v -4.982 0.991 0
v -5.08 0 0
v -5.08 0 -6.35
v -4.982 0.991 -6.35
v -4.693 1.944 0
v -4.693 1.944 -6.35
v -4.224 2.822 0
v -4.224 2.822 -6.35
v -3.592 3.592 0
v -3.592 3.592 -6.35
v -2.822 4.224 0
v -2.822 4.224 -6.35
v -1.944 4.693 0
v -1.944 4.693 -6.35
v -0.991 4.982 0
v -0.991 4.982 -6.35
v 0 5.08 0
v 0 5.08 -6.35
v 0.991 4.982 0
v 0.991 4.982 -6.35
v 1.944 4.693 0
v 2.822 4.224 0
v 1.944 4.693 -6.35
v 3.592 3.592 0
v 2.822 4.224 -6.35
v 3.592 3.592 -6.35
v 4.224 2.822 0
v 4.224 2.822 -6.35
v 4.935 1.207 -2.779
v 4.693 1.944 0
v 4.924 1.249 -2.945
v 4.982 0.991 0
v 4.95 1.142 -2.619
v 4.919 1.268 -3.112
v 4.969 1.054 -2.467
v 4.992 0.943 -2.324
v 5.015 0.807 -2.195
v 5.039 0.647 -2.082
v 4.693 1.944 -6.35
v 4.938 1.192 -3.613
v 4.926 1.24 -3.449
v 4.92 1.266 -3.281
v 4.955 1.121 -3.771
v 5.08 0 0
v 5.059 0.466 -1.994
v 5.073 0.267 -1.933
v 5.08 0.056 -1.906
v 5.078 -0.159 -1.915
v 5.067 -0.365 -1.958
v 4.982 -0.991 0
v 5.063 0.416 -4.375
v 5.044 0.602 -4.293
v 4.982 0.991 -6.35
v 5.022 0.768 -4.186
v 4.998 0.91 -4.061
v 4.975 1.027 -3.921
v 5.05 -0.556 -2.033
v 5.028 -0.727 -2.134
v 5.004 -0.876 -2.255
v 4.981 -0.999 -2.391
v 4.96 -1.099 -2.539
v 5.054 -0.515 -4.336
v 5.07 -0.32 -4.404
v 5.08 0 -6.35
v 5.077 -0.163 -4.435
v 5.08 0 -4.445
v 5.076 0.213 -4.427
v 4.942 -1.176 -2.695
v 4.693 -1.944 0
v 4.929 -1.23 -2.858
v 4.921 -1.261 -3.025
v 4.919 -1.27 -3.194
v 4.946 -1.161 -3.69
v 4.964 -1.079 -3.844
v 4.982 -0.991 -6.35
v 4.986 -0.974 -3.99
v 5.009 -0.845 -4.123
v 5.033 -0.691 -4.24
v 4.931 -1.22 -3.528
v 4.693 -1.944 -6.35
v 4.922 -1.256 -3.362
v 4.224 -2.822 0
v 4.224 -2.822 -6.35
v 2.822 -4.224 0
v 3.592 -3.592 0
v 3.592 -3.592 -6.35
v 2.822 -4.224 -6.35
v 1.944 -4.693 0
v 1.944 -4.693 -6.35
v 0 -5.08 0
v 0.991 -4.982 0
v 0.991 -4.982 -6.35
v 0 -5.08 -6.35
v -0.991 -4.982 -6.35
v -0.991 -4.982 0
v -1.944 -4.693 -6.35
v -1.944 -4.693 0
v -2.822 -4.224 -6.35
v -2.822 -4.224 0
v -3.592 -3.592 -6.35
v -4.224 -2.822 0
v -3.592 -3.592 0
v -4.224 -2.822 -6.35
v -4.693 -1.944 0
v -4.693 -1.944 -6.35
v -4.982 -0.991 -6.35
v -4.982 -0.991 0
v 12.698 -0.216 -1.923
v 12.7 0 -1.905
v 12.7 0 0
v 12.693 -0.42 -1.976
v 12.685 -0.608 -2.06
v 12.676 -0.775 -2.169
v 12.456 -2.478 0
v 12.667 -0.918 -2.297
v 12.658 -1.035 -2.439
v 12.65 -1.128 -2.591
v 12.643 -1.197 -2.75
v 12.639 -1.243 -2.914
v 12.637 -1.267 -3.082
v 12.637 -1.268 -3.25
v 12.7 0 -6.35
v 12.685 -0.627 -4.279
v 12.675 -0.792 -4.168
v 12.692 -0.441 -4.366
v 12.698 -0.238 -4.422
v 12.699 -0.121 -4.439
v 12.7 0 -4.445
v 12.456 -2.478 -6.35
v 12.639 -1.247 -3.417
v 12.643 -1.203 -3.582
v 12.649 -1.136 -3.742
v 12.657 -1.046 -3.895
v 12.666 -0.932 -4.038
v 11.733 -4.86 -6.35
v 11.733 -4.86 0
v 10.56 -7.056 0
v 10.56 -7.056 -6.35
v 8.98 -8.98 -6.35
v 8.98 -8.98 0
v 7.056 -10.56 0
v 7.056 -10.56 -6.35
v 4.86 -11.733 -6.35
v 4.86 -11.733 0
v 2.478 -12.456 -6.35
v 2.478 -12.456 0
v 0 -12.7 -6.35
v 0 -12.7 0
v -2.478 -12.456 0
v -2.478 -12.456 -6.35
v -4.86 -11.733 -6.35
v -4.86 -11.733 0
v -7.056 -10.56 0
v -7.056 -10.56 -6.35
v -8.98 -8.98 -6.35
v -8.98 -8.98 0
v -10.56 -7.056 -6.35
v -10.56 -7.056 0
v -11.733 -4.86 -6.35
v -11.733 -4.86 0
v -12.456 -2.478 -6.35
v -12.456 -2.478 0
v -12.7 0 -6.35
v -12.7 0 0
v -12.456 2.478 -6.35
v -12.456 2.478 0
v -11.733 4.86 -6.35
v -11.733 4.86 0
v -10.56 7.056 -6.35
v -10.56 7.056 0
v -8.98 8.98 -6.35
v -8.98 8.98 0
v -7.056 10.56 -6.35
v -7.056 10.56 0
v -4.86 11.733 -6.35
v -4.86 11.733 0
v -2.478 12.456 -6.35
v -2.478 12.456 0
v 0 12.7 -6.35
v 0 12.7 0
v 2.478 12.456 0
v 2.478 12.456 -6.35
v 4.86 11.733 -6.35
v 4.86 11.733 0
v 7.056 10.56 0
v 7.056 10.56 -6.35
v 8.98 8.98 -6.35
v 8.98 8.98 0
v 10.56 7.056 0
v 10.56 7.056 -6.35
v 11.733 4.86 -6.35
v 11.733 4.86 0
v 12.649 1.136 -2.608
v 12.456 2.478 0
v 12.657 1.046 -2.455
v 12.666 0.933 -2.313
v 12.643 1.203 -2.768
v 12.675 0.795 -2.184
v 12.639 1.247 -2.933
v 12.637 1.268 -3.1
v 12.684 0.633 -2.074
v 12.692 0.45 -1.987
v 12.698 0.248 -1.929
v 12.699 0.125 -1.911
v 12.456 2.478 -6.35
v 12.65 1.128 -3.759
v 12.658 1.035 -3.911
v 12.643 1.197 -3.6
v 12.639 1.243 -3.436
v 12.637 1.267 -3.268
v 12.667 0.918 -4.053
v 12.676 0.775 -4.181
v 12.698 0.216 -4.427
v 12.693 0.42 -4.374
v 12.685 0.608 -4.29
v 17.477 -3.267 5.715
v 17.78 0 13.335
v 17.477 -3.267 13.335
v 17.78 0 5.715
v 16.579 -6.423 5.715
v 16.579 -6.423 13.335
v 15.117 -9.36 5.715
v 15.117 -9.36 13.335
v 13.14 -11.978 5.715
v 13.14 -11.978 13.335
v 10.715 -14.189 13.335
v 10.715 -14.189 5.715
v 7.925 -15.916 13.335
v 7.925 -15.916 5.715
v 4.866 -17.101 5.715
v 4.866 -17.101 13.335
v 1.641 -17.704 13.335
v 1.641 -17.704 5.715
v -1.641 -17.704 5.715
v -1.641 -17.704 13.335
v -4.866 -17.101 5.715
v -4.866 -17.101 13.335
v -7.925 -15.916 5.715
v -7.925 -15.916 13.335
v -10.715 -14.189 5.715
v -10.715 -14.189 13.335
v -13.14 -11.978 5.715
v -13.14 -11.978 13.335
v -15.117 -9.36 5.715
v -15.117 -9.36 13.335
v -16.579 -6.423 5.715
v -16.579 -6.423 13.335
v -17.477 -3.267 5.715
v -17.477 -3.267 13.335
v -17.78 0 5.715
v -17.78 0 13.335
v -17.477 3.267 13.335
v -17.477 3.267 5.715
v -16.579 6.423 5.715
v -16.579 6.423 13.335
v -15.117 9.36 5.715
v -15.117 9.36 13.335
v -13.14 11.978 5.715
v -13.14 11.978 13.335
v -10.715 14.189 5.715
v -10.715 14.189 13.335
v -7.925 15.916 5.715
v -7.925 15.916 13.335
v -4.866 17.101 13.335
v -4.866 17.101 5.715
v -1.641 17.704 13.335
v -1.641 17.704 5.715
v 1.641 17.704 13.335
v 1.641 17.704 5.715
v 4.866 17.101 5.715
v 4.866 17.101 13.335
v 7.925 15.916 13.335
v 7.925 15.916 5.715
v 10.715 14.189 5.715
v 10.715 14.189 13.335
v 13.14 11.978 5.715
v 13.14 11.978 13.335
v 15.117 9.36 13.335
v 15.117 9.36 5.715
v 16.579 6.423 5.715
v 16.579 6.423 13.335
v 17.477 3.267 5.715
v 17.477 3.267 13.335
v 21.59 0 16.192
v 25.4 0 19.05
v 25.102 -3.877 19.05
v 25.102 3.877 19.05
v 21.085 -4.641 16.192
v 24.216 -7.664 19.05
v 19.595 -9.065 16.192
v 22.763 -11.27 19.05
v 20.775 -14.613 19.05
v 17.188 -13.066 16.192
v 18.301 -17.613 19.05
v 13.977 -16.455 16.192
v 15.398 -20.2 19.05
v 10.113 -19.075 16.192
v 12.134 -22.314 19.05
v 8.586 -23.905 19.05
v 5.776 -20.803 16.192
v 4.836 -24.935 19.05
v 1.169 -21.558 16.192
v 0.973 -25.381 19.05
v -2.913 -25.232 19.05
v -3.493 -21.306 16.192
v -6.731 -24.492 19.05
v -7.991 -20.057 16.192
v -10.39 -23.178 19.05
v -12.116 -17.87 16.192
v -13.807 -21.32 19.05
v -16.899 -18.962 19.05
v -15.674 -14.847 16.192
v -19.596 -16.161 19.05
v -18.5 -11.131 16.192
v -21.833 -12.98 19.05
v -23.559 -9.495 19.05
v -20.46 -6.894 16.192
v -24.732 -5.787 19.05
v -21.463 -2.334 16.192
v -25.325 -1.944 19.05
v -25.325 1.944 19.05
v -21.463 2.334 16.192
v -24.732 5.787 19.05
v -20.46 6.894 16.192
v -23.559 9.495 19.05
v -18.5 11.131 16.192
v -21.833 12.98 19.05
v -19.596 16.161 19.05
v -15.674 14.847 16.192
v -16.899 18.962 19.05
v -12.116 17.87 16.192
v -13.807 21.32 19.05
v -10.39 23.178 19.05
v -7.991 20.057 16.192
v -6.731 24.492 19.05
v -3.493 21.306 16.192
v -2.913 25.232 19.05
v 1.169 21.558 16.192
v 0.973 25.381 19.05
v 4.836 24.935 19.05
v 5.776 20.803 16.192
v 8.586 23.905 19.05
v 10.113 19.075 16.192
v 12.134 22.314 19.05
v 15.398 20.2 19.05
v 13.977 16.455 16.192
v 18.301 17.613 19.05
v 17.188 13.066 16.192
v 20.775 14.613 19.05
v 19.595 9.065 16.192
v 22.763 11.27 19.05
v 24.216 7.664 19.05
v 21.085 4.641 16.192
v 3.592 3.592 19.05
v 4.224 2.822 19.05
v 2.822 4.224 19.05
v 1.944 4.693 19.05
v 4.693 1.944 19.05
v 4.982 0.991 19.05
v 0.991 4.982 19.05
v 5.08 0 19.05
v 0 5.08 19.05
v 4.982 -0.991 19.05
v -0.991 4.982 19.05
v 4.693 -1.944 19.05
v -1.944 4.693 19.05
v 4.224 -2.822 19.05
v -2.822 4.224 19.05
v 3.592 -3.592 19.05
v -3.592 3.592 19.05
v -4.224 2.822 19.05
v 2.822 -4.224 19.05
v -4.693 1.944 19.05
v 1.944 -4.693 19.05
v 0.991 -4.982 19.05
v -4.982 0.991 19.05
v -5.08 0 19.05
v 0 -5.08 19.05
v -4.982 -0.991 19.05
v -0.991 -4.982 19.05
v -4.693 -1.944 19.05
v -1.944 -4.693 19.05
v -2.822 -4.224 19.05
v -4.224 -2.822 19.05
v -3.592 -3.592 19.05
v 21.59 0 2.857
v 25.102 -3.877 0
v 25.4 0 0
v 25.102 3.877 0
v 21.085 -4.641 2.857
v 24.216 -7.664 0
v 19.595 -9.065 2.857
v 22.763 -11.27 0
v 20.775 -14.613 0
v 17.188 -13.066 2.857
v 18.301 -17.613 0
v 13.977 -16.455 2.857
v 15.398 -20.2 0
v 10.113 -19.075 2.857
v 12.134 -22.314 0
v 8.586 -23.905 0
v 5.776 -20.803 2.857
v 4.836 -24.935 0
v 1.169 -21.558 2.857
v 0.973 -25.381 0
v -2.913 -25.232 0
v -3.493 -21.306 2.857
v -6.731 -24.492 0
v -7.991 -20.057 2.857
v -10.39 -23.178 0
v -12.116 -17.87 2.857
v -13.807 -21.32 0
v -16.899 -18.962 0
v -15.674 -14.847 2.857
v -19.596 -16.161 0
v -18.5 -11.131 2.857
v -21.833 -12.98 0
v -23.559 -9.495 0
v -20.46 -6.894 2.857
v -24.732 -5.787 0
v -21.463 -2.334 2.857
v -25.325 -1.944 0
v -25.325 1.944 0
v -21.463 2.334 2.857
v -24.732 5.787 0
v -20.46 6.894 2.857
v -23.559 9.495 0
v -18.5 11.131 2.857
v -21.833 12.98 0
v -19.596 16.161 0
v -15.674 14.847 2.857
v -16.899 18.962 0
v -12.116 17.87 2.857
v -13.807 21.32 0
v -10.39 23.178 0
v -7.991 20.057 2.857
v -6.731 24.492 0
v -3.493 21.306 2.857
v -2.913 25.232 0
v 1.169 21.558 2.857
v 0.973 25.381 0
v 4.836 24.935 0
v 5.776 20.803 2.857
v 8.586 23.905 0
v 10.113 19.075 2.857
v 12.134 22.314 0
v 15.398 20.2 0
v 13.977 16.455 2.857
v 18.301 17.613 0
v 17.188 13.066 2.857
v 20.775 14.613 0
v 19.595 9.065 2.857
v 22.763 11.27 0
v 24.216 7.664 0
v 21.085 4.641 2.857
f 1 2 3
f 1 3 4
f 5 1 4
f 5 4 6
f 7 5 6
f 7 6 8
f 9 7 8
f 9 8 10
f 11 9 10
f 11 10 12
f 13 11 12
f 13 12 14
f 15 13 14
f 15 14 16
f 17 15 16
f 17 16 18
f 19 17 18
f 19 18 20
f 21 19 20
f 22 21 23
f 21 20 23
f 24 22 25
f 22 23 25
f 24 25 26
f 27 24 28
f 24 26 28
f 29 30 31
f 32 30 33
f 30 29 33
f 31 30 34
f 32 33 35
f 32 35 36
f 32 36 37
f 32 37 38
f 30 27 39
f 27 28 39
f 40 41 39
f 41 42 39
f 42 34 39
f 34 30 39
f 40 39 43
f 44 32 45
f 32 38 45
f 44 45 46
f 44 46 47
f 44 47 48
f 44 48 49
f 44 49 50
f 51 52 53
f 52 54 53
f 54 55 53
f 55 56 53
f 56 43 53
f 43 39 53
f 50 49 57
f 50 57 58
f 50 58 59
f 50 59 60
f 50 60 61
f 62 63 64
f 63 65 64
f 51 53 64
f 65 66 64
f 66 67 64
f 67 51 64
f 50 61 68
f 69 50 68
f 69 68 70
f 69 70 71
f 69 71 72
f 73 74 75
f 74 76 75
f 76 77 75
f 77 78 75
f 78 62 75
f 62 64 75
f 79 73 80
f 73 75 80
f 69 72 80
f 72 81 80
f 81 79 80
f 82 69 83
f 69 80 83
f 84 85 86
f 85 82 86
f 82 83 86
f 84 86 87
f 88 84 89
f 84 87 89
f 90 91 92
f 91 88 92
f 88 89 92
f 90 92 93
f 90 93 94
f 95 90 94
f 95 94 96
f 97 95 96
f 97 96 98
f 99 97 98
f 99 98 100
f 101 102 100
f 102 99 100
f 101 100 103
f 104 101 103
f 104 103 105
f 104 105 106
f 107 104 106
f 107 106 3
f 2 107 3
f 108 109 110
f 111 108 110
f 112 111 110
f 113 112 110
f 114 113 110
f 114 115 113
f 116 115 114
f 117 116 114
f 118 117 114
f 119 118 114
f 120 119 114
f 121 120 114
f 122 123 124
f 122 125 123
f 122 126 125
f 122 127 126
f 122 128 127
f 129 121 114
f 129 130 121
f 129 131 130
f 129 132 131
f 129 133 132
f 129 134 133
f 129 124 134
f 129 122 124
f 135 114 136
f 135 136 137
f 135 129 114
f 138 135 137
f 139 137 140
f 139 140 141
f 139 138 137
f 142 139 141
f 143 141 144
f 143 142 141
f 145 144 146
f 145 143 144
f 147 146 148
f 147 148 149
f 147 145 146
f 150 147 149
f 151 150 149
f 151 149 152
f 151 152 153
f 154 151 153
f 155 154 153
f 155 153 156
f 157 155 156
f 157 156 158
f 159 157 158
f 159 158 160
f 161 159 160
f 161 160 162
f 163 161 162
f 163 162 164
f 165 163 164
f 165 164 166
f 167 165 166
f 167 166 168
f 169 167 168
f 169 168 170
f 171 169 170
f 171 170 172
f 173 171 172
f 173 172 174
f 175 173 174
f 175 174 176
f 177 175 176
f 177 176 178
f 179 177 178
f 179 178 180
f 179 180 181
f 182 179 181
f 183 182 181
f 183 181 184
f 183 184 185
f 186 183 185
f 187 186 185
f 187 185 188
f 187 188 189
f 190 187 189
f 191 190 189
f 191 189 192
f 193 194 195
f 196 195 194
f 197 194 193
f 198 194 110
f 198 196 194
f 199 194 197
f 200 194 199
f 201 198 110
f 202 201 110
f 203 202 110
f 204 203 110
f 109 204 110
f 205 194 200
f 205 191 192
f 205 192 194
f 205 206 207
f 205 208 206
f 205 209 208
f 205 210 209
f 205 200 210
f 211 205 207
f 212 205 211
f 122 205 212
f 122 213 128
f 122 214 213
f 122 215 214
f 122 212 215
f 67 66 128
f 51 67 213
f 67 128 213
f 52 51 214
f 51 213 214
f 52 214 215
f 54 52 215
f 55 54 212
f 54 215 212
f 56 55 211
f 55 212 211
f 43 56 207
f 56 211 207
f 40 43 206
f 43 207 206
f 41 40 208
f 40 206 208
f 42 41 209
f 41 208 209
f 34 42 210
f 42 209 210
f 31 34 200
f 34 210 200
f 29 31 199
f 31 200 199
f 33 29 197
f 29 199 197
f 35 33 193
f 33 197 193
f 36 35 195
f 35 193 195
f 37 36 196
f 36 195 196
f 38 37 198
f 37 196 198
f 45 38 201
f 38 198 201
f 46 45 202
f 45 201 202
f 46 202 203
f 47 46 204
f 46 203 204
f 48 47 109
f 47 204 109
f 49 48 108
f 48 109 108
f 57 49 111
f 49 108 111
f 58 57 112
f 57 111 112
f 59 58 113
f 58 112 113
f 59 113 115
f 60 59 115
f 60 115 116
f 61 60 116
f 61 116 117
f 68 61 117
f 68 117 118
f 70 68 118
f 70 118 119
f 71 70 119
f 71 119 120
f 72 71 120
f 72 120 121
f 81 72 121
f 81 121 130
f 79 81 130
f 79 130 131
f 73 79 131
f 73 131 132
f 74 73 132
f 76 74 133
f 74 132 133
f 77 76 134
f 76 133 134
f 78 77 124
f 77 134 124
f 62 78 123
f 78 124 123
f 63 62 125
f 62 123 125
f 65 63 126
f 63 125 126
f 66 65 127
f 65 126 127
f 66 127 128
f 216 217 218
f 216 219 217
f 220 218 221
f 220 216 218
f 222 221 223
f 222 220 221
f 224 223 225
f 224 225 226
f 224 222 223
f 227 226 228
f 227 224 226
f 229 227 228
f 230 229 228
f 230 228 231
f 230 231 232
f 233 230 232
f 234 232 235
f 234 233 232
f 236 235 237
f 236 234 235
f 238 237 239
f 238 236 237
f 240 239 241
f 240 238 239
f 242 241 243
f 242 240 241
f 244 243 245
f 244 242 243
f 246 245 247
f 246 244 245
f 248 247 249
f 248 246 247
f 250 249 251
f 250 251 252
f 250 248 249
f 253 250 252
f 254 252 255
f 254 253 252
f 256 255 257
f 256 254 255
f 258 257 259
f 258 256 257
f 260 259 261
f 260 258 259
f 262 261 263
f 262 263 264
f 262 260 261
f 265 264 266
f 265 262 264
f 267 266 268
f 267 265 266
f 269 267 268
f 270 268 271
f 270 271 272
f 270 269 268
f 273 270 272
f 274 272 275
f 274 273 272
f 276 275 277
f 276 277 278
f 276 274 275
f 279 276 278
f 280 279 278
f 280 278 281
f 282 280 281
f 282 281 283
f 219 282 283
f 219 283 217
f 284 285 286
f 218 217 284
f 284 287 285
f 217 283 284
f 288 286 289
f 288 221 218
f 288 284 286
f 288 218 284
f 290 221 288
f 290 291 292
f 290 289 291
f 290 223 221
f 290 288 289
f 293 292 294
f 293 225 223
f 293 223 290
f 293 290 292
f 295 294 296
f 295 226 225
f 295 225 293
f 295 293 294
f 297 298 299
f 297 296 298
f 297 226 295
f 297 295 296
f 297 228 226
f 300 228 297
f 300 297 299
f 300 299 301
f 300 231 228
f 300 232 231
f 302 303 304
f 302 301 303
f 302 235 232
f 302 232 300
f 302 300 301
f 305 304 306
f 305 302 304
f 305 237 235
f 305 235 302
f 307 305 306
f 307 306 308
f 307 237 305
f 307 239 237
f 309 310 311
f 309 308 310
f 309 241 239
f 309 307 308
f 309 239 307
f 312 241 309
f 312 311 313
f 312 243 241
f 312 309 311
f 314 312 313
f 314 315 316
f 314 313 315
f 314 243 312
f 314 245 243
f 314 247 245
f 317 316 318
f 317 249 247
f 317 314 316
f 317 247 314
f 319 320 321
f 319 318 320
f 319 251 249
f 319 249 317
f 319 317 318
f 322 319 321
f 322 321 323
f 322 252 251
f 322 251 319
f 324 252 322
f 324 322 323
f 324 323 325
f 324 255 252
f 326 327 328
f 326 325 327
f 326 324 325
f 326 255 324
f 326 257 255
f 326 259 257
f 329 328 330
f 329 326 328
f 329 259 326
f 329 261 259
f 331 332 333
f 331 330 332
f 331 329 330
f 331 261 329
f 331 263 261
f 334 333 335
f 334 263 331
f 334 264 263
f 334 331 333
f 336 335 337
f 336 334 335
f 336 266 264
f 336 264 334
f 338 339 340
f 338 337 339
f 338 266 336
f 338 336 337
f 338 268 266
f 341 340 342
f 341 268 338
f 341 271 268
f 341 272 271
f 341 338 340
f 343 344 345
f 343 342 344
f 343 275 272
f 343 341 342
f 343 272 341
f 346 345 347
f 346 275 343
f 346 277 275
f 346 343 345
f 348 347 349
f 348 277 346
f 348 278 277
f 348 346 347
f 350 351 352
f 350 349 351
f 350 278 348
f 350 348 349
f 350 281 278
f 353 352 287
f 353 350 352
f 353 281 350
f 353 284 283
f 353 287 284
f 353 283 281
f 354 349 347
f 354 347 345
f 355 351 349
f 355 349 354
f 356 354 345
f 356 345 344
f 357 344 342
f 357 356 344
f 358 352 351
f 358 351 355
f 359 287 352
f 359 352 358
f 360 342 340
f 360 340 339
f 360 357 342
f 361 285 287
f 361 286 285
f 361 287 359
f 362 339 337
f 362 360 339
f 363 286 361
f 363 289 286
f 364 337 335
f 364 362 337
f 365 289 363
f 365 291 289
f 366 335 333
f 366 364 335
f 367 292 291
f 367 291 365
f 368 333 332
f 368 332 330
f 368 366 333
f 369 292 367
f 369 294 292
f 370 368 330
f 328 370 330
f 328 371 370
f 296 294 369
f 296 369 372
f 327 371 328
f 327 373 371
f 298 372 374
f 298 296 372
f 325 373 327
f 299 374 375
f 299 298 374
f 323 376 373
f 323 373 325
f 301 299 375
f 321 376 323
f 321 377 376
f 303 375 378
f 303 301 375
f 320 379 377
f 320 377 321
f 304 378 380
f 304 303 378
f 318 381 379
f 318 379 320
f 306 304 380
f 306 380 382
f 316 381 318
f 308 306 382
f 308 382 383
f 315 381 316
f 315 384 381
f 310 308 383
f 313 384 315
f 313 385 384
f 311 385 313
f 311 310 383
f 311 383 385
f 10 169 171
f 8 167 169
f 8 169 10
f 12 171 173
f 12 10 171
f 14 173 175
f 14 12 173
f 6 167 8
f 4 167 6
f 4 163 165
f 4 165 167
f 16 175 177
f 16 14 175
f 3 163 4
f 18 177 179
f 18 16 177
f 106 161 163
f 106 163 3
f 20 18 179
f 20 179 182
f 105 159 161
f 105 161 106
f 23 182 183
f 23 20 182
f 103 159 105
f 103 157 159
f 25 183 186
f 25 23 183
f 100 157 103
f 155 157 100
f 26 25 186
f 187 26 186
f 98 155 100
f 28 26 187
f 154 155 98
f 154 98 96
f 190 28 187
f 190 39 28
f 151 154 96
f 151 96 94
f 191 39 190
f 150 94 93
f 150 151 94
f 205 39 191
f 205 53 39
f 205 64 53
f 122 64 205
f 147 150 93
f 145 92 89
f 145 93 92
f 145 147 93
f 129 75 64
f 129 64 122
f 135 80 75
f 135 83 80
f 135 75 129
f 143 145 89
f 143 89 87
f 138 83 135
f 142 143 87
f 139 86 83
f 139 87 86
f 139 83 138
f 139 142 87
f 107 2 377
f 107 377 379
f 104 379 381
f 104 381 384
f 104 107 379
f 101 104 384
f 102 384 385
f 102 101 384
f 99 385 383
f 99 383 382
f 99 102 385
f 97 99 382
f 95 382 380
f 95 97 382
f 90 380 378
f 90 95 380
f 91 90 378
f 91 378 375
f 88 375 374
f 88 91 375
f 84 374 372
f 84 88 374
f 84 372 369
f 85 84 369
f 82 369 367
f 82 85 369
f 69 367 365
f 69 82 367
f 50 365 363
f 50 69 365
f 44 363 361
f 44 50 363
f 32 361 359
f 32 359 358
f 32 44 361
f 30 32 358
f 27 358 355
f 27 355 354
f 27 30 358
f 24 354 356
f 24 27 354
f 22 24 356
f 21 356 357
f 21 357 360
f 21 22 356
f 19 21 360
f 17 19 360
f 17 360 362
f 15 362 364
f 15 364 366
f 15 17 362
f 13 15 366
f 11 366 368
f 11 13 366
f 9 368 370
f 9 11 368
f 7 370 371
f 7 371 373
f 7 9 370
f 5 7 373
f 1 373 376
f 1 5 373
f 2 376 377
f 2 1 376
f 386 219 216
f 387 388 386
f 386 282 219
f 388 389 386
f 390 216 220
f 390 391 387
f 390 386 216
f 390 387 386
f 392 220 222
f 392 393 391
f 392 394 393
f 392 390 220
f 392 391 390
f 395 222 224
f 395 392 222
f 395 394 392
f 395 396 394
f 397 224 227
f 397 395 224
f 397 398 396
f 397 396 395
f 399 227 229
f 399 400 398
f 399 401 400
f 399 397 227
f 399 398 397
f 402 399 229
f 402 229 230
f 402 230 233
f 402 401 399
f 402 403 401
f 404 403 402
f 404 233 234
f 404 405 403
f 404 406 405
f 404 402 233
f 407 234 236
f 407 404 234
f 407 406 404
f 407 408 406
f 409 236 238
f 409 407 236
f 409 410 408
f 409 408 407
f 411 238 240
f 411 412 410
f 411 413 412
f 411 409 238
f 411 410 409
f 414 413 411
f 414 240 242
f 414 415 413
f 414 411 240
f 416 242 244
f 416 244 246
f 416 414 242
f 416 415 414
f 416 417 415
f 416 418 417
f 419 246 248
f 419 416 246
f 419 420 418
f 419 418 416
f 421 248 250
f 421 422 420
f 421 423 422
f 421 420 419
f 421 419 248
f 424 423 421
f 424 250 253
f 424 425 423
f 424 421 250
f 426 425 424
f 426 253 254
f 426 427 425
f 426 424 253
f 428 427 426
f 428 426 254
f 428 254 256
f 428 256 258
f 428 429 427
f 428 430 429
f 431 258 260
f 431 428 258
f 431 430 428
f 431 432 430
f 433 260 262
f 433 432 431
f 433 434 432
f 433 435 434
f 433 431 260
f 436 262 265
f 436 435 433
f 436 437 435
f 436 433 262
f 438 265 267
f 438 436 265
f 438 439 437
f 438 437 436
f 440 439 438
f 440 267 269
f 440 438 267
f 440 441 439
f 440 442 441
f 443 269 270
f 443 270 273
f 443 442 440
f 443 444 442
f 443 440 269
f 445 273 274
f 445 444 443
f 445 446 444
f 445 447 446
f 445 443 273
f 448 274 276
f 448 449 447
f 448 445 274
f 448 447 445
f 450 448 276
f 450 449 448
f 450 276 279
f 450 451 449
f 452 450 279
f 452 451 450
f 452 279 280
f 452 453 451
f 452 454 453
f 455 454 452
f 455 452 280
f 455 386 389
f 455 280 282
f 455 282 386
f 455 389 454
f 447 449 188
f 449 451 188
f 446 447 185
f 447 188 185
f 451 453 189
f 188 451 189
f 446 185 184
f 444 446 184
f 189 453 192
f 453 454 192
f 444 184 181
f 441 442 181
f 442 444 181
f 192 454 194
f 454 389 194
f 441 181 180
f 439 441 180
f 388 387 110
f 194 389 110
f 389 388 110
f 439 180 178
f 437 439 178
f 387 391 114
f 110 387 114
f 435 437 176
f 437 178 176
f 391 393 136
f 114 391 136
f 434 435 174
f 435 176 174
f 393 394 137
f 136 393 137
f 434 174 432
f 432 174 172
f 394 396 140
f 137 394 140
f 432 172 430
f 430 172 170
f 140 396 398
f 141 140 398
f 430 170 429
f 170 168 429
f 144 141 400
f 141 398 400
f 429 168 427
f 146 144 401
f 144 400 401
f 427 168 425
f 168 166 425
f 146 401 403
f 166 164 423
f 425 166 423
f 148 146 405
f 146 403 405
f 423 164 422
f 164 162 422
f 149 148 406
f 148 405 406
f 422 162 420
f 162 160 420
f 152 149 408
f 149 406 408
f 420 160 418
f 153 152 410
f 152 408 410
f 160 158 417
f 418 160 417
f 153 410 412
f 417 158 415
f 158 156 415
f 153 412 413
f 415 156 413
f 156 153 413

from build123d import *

# Parameters (mm, degrees)
SKETCH1_R               = 25.4
SKETCH1_R_2             = 5.08
BOSS_EXTRUDE1_DEPTH     = 19.05
BOSS_EXTRUDE2_START     = 6.35
SKETCH4_R               = 12.7
SKETCH4_R_2             = 5.08
BOSS_EXTRUDE2_DEPTH     = 6.35
CUT_EXTRUDE1_REACH      = 51.595
CUT_EXTRUDE1_END_RADIUS = 5.08
SKETCH5_R               = 1.27


with BuildPart() as part:
    # Sketch1 → Boss-Extrude1 (new body)
    with BuildSketch(Plane.XY):
        with Locations(Location((0, 0, 0), (0, 0, 180))):
            Circle(SKETCH1_R)
        with Locations(Location((0, 0, 0), (0, 0, 180))):
            Circle(SKETCH1_R_2, mode=Mode.SUBTRACT)
    extrude(amount=BOSS_EXTRUDE1_DEPTH)

    # Sketch3 → Cut-Revolve1 (revolve, cut)
    with BuildSketch(Plane(origin=(0, 0, 0), x_dir=(0, 0, -1), z_dir=(1, 0, 0)), mode=Mode.PRIVATE) as cut_revolve1_sk:
        Polygon((0, 25.4), (0, 34.911662418), (-19.05, 34.911662418), (-19.05, 25.4), (-13.335, 17.78), (-5.715, 17.78), align=None)
    revolve(cut_revolve1_sk.sketch.rotate(Axis((0, 0, 21.061205324), (0, 0, -1)), 90), axis=Axis((0, 0, 21.061205324), (0, 0, -1)), mode=Mode.SUBTRACT)

    # Sketch4 → Boss-Extrude2 (add)
    with BuildSketch(Plane(origin=(0, 0, 0), x_dir=(-1, 0, 0), z_dir=(0, 0, -1)).offset(BOSS_EXTRUDE2_START)):
        with Locations(Location((0, 0, 0), (0, 0, 180))):
            Circle(SKETCH4_R)
        Circle(SKETCH4_R_2, mode=Mode.SUBTRACT)
    extrude(amount=-BOSS_EXTRUDE2_DEPTH)

    # Cut-Extrude1: up to this cylinder (the profile starts outside it)
    cut_extrude1_end = Plane(origin=(0, 0, -3.175), z_dir=(0, 0, -1)) * Cylinder(CUT_EXTRUDE1_END_RADIUS, 114.35, mode=Mode.PRIVATE)
    # Sketch5 → Cut-Extrude1 (cut, up to the surface)
    with BuildSketch(Plane(origin=(12.7, 0, 0), x_dir=(0, 0, -1), z_dir=(1, 0, 0)), mode=Mode.PRIVATE) as cut_extrude1_sk1:
        with Locations((3.175, 0)):
            Circle(SKETCH5_R)
    cut_extrude1_tool1 = extrude(cut_extrude1_sk1.sketch, amount=-CUT_EXTRUDE1_REACH, mode=Mode.PRIVATE) - cut_extrude1_end
    add(cut_extrude1_tool1.solids().sort_by_distance((12.7, 0, -3.175))[0], mode=Mode.SUBTRACT)


solid = part.part
